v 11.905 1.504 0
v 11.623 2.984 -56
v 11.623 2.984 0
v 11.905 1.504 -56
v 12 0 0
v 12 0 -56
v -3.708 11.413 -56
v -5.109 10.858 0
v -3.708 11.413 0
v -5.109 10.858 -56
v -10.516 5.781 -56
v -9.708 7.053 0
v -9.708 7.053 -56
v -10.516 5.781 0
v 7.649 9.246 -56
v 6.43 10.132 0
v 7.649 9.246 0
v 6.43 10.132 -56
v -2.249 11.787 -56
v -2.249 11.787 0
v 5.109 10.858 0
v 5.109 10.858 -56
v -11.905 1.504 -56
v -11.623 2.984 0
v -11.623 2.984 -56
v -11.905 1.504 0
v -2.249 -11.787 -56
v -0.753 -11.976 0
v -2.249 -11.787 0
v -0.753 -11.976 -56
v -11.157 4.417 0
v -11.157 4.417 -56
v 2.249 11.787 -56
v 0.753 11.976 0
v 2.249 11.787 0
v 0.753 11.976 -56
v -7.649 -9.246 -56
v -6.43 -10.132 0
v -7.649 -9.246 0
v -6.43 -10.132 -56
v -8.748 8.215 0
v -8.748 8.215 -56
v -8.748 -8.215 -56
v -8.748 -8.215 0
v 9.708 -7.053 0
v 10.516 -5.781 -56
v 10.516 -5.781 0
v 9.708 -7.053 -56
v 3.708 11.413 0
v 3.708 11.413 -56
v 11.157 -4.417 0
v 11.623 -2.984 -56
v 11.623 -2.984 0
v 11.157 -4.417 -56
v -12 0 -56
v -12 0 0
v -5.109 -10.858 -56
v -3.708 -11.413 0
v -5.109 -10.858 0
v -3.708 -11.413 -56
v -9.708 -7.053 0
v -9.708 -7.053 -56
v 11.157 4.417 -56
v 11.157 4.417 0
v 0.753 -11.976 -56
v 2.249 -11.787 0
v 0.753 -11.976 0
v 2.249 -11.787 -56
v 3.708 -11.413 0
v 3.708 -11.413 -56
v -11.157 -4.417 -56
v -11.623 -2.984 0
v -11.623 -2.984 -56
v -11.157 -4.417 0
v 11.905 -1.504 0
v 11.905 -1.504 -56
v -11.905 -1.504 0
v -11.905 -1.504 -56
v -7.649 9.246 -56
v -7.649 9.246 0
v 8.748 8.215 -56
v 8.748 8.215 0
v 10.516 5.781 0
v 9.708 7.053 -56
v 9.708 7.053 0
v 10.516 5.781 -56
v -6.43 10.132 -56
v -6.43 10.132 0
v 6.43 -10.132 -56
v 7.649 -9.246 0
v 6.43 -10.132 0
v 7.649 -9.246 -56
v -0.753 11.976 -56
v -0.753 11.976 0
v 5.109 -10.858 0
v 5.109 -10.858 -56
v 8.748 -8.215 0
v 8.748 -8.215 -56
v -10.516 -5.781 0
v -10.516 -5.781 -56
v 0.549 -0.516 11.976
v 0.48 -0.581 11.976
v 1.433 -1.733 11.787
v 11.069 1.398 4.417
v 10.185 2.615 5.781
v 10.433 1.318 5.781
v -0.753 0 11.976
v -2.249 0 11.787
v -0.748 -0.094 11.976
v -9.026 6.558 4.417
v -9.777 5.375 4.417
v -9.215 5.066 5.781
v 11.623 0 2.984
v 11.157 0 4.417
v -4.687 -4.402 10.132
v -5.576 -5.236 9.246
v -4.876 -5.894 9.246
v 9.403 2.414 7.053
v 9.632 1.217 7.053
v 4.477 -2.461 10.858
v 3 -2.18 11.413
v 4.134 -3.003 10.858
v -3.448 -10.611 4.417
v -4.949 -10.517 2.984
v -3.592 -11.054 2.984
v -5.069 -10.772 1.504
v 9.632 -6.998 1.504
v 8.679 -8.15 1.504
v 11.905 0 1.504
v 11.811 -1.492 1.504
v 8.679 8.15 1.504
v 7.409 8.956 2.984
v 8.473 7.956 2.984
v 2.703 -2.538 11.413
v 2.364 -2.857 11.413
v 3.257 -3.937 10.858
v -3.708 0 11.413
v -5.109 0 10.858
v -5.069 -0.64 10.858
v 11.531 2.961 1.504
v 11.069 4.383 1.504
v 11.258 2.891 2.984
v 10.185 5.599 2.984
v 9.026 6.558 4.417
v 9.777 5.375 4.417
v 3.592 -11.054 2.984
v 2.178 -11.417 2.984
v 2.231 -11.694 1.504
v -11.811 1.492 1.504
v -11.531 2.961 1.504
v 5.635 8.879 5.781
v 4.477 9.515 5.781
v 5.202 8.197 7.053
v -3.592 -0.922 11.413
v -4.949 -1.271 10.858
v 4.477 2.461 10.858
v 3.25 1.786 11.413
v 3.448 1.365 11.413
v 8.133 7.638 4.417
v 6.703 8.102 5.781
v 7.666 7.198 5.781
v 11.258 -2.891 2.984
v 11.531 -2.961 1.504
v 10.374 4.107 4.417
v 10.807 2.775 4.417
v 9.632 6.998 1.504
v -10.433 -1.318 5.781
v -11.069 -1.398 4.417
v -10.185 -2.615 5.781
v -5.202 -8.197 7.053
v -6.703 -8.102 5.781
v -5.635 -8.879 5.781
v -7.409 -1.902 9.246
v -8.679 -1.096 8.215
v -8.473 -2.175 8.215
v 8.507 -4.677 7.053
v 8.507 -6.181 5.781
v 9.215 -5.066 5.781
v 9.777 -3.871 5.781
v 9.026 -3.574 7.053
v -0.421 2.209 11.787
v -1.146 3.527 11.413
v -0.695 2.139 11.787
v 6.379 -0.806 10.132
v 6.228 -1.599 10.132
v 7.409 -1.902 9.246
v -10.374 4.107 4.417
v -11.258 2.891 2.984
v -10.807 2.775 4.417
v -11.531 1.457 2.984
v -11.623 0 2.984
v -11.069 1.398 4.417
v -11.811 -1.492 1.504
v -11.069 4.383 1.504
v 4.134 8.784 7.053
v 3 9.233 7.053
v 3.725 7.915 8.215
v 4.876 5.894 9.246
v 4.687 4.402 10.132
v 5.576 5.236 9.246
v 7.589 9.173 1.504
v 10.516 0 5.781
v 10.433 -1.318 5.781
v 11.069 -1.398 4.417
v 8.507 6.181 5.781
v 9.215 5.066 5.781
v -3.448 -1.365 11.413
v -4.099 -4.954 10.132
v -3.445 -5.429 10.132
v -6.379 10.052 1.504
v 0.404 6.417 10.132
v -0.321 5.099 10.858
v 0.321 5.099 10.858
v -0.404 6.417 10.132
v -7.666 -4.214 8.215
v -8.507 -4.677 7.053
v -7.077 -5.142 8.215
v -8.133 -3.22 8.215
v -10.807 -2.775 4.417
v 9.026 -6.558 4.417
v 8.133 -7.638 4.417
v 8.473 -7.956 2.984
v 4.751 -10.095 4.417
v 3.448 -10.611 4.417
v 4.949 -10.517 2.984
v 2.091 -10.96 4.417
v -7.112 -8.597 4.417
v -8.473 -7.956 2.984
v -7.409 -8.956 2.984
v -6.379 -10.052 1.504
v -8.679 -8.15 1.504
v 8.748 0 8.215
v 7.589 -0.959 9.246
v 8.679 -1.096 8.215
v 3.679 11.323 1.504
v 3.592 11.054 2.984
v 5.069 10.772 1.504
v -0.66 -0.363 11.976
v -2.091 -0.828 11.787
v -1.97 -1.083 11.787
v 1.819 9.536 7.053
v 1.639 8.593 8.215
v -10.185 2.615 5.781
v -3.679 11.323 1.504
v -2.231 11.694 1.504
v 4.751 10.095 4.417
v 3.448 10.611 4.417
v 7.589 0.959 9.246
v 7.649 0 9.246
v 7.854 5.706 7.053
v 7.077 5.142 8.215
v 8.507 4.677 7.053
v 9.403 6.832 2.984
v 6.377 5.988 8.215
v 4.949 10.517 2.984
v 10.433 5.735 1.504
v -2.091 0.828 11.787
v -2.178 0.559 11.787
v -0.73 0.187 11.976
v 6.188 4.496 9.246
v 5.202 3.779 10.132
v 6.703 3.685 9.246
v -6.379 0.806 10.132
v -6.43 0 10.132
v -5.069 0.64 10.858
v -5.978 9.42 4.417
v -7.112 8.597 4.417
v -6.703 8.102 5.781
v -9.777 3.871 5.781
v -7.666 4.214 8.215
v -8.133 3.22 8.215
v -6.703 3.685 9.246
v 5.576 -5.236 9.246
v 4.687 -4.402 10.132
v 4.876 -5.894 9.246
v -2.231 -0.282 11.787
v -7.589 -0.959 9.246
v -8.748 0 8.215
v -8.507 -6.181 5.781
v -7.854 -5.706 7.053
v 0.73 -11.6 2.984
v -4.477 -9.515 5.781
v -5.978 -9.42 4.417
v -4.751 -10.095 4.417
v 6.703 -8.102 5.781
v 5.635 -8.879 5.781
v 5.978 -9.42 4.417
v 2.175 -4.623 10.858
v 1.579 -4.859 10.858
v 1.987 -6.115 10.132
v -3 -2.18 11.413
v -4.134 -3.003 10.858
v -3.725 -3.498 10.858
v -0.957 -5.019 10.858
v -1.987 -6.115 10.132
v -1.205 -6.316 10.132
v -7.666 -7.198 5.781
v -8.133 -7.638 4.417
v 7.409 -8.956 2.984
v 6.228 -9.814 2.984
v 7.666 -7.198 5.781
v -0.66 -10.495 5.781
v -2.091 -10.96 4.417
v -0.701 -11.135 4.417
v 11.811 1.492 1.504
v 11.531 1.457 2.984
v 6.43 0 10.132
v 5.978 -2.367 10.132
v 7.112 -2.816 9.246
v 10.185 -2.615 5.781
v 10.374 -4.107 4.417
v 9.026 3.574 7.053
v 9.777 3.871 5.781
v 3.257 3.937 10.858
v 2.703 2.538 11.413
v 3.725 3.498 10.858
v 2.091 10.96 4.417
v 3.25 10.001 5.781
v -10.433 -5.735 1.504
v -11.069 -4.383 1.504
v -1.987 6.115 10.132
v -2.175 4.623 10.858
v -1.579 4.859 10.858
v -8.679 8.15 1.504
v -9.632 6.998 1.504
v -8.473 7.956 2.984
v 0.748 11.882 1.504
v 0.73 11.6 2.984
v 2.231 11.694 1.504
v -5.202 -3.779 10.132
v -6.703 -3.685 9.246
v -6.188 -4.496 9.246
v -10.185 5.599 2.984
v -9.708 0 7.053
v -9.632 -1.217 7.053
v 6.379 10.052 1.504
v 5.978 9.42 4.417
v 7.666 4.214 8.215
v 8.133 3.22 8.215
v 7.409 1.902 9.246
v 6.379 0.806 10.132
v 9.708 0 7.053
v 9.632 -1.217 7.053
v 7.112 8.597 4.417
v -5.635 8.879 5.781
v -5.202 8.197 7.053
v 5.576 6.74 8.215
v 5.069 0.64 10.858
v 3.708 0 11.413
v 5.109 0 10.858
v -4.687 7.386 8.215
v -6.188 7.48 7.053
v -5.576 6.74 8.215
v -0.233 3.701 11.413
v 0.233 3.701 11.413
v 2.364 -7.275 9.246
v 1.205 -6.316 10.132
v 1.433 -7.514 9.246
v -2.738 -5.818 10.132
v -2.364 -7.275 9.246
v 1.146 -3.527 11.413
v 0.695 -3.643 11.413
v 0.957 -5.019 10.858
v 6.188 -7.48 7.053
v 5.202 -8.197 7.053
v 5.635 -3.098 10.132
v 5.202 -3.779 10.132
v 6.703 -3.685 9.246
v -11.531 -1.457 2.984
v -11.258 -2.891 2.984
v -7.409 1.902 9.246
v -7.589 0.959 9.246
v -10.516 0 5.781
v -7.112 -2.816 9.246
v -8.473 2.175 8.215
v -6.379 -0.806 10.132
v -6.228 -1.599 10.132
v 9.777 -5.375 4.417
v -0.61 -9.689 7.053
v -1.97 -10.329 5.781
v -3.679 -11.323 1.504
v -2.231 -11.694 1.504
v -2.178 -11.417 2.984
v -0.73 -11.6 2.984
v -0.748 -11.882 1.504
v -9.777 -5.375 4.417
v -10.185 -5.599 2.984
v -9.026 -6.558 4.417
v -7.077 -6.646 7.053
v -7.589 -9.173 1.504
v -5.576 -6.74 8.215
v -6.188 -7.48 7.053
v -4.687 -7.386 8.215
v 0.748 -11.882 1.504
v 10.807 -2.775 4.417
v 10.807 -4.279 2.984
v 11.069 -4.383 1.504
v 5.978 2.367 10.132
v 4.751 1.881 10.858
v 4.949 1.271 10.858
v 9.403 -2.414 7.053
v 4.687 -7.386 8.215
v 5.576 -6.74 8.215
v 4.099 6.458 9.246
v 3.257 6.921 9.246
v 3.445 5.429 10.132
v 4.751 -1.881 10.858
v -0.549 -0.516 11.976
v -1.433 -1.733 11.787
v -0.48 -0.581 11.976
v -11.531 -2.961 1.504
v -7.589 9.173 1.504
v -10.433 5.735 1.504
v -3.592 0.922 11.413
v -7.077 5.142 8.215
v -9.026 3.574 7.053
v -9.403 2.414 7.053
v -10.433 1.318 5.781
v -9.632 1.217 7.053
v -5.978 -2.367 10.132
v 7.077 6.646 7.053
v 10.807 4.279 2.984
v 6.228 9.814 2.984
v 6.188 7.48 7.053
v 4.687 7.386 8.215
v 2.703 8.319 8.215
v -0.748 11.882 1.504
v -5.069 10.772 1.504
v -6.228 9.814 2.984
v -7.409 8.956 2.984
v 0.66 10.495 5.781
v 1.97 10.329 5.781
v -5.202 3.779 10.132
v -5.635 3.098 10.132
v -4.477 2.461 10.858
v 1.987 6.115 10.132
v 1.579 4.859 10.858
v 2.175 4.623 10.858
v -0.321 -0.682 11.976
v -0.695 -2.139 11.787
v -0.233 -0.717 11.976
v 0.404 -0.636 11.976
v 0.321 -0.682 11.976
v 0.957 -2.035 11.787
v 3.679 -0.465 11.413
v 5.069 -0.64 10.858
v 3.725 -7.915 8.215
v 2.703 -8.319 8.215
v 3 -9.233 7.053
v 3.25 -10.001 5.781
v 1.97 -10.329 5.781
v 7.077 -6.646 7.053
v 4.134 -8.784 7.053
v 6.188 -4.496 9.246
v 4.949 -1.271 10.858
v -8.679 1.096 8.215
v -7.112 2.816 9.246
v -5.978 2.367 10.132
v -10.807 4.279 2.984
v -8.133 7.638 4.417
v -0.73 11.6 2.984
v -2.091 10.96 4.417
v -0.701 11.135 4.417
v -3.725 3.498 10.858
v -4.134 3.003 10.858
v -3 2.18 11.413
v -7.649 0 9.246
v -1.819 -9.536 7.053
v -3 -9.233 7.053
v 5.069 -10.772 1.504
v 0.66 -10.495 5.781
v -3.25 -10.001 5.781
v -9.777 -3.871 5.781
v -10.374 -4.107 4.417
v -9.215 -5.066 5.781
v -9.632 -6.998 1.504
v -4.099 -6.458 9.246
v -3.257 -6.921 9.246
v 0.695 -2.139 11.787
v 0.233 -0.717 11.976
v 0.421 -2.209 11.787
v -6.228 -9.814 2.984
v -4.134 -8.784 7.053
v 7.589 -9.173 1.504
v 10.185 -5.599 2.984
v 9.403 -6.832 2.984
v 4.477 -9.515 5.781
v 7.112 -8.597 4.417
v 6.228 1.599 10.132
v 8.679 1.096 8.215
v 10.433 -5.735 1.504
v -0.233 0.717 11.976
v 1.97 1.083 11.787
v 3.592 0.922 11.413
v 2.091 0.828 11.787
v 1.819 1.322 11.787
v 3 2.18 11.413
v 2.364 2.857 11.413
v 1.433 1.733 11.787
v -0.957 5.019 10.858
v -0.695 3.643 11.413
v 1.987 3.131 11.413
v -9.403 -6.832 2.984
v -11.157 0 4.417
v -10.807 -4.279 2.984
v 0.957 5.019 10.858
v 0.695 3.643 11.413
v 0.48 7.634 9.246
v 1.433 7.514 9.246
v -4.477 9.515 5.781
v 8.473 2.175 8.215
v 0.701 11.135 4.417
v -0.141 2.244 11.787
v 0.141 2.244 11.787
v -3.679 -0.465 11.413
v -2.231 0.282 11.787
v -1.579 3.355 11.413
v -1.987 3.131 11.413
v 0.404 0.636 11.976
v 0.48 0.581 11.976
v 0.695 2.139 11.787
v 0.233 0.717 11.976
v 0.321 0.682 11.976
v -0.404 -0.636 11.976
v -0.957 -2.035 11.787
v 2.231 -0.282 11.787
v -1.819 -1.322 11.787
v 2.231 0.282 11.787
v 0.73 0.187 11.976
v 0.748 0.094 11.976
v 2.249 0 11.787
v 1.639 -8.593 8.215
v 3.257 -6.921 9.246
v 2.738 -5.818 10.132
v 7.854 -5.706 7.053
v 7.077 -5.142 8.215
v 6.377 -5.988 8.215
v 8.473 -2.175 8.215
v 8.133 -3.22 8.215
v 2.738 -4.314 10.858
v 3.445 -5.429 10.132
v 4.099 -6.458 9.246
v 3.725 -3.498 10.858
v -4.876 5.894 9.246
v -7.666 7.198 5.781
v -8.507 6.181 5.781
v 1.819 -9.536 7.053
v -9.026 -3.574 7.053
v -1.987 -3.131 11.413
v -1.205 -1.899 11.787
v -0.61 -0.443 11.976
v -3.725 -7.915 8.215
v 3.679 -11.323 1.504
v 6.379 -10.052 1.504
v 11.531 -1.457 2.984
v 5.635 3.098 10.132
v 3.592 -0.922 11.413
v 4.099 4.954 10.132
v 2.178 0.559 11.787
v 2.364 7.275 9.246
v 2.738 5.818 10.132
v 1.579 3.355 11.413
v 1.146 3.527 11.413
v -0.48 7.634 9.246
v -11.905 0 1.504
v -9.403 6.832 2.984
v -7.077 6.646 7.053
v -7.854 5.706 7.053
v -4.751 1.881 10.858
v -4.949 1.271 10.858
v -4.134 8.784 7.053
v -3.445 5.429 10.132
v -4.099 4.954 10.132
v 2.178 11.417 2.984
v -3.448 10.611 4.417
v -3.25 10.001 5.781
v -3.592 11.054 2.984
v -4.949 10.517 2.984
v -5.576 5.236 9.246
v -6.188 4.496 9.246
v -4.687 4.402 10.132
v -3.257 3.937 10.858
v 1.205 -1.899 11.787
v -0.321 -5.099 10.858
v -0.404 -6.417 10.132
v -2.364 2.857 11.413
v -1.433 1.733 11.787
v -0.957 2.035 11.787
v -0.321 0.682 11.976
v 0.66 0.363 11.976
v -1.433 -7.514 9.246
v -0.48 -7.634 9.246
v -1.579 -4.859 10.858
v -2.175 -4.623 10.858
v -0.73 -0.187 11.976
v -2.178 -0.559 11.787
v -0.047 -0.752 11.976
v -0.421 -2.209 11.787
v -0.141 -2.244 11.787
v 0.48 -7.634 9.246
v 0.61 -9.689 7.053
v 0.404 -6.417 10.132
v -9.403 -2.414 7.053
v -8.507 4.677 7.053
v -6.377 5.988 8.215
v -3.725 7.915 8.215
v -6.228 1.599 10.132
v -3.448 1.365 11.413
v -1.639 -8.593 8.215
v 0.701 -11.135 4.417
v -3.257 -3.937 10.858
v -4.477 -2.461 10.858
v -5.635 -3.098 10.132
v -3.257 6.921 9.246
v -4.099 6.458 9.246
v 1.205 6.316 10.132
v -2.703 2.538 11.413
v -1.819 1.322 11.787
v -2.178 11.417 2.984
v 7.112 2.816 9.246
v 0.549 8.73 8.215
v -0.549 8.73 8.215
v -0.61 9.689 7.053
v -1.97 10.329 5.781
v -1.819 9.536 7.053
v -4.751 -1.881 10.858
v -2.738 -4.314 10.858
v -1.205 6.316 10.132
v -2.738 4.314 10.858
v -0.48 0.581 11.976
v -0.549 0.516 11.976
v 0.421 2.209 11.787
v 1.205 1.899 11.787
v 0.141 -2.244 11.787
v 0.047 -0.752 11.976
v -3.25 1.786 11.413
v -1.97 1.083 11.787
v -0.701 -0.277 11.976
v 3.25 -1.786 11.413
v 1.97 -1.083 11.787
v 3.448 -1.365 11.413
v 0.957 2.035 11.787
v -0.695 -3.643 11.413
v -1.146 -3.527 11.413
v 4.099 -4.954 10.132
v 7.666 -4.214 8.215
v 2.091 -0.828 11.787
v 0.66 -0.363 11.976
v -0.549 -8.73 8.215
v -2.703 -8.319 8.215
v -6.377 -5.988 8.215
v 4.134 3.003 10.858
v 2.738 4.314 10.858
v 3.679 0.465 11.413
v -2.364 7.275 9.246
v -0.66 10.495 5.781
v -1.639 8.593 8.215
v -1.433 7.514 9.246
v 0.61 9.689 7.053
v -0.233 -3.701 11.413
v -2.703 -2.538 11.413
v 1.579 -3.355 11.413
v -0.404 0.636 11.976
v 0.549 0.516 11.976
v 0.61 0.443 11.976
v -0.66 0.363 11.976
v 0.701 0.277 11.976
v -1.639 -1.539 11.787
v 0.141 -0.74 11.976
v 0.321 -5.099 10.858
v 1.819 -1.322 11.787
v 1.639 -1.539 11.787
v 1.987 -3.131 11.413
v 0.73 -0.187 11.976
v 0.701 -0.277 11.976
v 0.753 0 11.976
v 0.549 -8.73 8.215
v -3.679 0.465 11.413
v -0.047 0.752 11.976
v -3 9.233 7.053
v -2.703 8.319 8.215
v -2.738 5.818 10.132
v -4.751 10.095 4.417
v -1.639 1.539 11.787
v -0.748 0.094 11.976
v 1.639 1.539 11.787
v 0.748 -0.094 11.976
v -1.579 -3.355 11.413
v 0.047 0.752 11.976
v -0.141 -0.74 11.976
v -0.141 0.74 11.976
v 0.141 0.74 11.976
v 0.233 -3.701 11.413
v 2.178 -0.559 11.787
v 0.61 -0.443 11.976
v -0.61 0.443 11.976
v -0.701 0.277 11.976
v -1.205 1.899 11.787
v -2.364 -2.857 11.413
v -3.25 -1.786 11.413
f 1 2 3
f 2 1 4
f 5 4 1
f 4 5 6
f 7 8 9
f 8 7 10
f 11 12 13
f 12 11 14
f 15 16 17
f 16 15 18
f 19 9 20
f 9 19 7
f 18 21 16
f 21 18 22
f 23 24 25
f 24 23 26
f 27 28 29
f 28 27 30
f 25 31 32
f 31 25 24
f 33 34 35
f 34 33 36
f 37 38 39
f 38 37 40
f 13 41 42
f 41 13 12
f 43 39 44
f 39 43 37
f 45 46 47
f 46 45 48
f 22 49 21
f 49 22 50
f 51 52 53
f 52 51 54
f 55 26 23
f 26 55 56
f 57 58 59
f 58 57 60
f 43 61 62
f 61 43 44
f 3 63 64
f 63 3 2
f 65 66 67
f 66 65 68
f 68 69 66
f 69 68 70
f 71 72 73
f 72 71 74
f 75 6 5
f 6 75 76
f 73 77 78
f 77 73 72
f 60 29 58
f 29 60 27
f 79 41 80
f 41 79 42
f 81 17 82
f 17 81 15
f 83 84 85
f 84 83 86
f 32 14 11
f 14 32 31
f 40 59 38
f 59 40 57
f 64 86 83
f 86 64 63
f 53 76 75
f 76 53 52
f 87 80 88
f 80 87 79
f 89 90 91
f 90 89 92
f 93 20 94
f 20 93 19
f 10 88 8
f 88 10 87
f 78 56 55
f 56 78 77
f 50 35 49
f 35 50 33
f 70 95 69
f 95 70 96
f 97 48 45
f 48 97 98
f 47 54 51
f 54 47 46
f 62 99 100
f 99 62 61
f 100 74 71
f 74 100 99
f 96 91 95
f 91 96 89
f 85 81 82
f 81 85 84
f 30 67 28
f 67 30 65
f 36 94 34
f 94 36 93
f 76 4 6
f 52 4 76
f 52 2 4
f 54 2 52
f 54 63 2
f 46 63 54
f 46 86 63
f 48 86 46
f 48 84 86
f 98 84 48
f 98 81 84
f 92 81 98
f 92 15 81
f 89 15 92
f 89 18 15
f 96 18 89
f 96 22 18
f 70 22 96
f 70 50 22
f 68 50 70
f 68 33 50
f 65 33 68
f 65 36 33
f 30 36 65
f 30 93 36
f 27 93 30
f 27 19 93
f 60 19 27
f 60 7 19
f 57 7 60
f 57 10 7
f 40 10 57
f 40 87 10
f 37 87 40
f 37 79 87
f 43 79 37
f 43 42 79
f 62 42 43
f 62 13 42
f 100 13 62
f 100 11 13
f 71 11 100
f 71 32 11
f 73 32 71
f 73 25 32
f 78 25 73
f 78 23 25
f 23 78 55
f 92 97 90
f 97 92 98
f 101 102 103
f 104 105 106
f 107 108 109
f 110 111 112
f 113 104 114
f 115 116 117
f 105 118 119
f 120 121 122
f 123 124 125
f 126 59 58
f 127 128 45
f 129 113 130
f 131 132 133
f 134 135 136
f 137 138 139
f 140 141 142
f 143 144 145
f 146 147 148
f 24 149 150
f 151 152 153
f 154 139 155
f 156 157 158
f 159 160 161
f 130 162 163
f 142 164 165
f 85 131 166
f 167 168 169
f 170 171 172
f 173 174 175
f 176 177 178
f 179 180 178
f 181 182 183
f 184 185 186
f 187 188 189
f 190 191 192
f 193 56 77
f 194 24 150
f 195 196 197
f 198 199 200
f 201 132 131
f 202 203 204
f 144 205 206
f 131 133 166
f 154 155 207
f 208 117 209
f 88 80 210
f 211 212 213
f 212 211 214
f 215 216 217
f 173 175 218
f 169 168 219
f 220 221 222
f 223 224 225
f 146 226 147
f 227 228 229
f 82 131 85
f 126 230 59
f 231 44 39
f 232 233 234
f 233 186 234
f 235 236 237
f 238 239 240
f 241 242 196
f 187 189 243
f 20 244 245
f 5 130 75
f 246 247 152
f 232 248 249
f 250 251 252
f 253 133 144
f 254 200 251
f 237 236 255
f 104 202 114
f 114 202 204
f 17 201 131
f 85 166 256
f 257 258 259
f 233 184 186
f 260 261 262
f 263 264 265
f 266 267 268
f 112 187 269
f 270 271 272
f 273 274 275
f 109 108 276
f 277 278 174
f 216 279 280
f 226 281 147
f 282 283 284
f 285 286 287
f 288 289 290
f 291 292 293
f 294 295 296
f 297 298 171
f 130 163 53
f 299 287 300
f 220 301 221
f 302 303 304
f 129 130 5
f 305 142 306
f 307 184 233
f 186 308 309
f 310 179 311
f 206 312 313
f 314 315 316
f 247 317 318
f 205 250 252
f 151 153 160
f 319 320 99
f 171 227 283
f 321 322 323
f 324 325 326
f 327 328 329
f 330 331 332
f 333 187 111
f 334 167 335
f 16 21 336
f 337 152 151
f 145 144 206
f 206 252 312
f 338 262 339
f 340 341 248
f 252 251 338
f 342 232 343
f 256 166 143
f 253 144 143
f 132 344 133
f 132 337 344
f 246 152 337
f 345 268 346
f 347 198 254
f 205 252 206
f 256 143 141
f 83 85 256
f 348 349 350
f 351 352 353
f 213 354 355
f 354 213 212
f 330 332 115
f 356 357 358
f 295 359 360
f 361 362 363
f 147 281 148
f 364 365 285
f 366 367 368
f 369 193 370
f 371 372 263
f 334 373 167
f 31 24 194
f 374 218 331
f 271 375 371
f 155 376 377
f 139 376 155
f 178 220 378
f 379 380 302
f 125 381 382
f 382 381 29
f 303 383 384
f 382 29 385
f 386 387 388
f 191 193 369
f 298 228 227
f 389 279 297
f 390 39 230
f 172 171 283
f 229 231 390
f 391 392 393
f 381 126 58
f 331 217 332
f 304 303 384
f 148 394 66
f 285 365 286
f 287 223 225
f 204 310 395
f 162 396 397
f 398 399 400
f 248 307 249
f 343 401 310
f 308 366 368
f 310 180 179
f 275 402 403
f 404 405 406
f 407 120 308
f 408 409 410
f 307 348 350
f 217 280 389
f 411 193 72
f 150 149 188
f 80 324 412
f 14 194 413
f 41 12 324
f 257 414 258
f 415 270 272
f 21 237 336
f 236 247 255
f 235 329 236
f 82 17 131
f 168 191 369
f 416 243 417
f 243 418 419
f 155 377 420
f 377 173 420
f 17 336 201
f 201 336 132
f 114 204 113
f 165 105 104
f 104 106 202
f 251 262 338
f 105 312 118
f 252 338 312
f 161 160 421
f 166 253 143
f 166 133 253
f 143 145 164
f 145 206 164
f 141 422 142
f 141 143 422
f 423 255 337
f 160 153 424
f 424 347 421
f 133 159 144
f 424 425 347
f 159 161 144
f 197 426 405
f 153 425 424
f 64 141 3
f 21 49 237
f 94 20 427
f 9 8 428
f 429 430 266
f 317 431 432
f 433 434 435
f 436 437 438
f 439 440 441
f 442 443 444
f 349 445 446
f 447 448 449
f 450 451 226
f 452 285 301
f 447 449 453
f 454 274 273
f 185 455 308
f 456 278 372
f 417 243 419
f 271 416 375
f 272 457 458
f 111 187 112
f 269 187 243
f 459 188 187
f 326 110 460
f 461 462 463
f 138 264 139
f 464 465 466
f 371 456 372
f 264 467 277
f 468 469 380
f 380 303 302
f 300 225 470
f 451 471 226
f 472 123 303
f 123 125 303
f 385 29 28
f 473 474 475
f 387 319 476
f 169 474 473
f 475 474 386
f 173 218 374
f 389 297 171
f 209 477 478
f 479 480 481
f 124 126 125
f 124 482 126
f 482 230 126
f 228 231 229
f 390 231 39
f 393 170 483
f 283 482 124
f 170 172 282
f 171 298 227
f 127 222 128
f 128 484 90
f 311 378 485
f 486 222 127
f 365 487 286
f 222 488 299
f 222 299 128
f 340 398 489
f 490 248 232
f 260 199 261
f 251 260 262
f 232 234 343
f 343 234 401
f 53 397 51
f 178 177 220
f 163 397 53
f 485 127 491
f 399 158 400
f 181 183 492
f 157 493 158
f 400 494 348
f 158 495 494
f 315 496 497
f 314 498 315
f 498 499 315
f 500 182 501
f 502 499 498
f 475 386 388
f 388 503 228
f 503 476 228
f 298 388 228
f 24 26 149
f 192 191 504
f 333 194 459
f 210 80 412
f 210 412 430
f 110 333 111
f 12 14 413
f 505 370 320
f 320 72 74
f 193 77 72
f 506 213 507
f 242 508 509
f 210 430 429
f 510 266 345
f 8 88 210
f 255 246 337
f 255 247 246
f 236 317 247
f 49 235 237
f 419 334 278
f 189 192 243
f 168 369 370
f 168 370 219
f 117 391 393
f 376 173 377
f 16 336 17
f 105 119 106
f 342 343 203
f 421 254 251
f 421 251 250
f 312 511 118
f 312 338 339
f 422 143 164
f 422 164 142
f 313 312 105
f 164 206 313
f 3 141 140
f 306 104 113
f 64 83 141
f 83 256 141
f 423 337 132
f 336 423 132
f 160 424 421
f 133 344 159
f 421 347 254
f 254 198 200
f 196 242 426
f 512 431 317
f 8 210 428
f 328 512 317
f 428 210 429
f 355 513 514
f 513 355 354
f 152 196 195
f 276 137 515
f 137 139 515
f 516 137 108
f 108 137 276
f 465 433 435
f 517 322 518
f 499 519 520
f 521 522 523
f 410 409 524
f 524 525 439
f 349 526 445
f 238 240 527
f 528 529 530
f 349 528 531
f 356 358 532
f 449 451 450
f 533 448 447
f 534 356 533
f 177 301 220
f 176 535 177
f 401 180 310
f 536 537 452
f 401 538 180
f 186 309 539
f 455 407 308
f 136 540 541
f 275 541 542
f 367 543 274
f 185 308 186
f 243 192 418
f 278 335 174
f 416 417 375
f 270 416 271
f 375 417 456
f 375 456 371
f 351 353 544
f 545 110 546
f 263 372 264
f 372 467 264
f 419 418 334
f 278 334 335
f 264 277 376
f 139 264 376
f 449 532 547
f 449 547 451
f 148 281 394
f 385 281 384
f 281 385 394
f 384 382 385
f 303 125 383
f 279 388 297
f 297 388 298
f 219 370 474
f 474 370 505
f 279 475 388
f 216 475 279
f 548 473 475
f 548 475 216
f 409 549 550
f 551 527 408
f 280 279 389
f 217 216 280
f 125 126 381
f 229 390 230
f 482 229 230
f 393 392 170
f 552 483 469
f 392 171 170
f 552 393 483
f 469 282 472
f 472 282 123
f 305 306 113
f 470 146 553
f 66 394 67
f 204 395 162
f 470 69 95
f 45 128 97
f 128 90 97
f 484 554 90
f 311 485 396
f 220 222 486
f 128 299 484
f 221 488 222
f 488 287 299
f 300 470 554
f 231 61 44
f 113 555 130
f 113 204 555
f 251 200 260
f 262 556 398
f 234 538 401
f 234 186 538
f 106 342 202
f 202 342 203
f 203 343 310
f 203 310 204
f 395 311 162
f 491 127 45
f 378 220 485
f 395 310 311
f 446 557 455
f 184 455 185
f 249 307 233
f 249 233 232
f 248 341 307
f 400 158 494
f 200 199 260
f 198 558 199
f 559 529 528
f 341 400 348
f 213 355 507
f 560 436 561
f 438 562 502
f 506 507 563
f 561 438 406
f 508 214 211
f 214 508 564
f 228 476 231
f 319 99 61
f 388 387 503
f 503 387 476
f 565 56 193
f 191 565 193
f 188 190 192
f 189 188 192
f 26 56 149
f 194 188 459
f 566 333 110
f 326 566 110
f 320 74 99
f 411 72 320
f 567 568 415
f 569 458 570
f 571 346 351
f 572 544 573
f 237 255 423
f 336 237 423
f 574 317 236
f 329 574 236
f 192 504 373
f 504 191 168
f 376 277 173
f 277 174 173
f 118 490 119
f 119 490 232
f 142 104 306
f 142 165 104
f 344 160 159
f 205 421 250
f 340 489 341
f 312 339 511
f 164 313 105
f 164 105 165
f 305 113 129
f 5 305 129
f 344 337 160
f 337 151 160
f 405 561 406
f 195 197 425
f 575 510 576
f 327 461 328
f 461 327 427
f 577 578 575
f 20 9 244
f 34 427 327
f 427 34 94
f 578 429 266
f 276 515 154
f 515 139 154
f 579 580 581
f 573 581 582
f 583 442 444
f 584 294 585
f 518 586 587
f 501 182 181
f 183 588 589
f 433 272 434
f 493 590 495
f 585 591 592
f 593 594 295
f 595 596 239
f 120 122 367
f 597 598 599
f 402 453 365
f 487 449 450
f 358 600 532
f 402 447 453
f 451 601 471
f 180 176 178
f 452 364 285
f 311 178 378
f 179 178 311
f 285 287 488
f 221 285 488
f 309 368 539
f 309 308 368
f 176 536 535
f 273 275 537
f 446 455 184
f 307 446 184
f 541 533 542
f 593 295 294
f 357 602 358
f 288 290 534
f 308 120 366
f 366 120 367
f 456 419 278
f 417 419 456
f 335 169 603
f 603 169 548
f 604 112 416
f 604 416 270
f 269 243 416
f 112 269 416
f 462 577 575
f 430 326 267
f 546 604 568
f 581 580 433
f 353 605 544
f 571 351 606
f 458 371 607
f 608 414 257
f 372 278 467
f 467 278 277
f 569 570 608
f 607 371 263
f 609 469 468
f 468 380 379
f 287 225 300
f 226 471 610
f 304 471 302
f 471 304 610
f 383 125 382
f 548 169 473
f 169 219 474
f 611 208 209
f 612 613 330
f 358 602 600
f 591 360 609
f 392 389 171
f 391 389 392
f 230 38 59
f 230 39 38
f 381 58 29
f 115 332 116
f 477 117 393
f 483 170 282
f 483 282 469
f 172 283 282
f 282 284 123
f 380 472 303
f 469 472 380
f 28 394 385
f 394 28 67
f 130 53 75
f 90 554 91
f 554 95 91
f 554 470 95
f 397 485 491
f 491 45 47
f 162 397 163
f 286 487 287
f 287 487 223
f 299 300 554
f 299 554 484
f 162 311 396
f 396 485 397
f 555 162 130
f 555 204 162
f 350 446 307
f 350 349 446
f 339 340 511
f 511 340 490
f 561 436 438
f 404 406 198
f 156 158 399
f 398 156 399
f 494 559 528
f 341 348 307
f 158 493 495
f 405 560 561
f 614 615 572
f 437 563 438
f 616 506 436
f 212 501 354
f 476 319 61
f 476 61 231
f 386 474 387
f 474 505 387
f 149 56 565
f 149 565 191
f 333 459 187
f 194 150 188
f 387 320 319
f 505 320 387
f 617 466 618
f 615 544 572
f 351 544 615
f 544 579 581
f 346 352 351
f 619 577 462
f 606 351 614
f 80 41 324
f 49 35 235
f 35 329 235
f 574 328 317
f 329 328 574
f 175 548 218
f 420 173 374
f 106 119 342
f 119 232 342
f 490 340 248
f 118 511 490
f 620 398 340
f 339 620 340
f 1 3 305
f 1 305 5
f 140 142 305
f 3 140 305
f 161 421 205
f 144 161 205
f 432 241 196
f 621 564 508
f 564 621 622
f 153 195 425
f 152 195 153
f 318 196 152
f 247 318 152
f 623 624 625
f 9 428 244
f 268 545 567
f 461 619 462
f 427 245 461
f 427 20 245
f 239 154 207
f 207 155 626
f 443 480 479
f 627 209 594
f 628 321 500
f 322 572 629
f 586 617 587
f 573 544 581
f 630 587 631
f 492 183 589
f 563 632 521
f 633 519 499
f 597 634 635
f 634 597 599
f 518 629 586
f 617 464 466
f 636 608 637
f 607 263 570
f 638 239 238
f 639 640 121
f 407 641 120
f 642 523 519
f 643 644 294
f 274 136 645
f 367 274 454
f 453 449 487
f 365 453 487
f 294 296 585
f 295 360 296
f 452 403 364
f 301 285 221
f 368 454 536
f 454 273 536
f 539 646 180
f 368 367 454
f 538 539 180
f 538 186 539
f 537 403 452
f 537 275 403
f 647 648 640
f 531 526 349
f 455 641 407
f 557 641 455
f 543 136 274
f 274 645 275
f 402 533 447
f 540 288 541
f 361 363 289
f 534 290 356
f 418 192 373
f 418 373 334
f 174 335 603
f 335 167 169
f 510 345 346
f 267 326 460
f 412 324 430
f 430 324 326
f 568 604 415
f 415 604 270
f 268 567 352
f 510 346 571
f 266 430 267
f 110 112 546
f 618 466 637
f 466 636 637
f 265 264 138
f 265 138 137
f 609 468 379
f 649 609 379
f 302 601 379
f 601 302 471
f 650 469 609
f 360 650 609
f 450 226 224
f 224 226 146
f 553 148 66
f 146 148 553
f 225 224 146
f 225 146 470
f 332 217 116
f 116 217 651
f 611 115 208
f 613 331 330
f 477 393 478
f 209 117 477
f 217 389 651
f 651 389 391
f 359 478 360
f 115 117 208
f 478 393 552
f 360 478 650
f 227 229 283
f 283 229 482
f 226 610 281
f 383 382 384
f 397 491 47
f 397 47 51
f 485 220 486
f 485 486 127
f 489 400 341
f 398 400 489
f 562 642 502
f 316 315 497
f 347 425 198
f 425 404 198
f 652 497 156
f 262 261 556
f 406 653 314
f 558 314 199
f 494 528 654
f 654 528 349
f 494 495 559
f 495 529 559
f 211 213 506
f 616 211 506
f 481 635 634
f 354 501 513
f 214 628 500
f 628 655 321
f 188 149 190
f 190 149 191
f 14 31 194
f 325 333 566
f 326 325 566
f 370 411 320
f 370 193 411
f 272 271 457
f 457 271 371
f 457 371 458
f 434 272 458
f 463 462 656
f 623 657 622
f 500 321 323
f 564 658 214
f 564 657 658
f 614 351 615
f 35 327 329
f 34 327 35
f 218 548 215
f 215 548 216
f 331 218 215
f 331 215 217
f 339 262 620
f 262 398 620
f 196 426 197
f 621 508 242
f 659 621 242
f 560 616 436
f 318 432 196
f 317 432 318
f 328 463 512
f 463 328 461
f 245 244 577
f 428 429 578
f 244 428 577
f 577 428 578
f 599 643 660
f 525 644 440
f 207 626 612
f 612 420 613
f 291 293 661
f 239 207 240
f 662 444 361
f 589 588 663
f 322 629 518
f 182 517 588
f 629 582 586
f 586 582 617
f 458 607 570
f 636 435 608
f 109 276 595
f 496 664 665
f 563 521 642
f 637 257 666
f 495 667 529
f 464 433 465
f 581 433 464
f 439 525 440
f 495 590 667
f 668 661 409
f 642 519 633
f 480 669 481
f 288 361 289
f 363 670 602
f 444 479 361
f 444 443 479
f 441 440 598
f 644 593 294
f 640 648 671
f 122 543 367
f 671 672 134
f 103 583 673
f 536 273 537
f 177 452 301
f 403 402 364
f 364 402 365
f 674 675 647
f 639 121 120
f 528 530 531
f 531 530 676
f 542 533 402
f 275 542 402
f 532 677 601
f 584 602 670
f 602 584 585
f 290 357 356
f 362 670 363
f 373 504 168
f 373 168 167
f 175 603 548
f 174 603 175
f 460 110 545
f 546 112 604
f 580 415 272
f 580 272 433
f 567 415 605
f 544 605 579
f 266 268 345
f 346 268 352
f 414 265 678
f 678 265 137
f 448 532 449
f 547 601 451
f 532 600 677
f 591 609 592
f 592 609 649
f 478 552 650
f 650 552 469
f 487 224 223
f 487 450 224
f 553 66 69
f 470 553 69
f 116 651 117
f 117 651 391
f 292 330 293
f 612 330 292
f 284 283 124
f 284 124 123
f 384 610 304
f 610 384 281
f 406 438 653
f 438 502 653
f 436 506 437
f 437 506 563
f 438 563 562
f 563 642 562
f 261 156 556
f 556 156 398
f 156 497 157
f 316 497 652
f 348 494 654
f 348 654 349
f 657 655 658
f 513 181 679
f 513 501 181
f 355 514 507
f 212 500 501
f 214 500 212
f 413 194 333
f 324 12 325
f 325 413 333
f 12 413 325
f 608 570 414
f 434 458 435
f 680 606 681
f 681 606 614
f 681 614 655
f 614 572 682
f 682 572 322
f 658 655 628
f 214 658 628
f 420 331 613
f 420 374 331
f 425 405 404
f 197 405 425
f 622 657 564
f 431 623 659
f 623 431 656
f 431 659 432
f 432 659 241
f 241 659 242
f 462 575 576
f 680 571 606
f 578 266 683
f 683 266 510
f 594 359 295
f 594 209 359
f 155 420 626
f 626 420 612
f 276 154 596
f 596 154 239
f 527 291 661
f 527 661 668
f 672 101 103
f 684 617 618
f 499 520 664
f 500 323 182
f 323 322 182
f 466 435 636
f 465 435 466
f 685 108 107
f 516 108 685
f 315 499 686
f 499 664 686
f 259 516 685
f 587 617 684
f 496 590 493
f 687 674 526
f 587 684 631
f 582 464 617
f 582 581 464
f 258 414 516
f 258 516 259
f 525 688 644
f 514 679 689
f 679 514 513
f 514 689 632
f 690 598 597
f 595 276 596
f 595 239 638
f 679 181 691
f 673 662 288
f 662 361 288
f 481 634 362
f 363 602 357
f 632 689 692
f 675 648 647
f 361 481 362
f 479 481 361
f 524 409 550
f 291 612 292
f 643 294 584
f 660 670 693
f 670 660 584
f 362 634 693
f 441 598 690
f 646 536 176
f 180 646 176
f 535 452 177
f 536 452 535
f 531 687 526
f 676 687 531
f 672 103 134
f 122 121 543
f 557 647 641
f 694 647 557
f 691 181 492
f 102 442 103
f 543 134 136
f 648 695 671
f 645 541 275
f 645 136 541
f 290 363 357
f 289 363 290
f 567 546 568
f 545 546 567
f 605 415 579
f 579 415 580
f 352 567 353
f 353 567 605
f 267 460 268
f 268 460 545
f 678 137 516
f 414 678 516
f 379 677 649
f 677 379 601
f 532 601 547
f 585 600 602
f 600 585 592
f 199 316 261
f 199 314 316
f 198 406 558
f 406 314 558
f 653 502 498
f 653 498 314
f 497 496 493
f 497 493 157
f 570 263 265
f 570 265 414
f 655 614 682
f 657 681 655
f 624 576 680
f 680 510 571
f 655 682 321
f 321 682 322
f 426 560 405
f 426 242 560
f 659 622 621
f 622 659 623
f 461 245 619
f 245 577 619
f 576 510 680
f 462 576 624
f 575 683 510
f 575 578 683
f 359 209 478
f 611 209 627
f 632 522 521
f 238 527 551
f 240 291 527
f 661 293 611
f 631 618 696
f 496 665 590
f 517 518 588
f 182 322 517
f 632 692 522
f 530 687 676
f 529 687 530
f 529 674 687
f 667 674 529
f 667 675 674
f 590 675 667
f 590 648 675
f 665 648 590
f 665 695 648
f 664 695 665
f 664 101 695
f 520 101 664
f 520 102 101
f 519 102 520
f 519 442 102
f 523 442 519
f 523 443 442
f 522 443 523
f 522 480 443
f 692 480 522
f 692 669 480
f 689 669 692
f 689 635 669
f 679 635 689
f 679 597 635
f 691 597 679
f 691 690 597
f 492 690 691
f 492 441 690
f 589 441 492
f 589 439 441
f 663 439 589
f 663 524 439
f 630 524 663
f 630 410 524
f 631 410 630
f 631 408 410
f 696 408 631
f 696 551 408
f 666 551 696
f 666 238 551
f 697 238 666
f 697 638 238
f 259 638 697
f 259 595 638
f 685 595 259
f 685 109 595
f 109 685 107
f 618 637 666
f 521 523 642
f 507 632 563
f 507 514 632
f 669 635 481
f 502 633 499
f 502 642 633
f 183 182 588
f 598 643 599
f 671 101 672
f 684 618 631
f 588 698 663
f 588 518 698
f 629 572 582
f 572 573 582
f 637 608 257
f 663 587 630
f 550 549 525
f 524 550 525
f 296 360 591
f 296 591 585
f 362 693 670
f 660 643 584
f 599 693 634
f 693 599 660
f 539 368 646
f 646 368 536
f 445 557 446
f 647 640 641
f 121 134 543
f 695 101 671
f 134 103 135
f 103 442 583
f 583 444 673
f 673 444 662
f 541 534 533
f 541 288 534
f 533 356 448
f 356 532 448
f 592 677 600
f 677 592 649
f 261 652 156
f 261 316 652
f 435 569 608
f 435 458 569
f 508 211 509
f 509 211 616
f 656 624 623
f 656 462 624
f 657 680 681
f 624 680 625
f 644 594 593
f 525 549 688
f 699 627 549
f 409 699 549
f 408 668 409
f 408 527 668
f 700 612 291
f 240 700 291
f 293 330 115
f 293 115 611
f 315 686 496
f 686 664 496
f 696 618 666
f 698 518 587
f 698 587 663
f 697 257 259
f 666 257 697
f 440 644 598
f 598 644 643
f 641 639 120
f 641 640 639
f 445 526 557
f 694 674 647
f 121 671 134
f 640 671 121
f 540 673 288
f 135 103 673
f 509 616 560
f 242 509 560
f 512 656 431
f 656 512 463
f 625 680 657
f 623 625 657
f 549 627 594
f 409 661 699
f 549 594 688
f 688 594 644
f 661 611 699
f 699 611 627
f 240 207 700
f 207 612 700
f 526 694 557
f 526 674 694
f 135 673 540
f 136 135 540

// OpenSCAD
//global
lent=50;
//wood-cylinder
cyD=24;
cyH=80-cyD;
color(c=[.3,.2,.1])
union(){
translate([0,0,-cyH/2]) cylinder(h=cyH, r=cyD/2,center=true,$fn=lent);
sphere(r=cyD/2,center=true,$fn=lent);}
